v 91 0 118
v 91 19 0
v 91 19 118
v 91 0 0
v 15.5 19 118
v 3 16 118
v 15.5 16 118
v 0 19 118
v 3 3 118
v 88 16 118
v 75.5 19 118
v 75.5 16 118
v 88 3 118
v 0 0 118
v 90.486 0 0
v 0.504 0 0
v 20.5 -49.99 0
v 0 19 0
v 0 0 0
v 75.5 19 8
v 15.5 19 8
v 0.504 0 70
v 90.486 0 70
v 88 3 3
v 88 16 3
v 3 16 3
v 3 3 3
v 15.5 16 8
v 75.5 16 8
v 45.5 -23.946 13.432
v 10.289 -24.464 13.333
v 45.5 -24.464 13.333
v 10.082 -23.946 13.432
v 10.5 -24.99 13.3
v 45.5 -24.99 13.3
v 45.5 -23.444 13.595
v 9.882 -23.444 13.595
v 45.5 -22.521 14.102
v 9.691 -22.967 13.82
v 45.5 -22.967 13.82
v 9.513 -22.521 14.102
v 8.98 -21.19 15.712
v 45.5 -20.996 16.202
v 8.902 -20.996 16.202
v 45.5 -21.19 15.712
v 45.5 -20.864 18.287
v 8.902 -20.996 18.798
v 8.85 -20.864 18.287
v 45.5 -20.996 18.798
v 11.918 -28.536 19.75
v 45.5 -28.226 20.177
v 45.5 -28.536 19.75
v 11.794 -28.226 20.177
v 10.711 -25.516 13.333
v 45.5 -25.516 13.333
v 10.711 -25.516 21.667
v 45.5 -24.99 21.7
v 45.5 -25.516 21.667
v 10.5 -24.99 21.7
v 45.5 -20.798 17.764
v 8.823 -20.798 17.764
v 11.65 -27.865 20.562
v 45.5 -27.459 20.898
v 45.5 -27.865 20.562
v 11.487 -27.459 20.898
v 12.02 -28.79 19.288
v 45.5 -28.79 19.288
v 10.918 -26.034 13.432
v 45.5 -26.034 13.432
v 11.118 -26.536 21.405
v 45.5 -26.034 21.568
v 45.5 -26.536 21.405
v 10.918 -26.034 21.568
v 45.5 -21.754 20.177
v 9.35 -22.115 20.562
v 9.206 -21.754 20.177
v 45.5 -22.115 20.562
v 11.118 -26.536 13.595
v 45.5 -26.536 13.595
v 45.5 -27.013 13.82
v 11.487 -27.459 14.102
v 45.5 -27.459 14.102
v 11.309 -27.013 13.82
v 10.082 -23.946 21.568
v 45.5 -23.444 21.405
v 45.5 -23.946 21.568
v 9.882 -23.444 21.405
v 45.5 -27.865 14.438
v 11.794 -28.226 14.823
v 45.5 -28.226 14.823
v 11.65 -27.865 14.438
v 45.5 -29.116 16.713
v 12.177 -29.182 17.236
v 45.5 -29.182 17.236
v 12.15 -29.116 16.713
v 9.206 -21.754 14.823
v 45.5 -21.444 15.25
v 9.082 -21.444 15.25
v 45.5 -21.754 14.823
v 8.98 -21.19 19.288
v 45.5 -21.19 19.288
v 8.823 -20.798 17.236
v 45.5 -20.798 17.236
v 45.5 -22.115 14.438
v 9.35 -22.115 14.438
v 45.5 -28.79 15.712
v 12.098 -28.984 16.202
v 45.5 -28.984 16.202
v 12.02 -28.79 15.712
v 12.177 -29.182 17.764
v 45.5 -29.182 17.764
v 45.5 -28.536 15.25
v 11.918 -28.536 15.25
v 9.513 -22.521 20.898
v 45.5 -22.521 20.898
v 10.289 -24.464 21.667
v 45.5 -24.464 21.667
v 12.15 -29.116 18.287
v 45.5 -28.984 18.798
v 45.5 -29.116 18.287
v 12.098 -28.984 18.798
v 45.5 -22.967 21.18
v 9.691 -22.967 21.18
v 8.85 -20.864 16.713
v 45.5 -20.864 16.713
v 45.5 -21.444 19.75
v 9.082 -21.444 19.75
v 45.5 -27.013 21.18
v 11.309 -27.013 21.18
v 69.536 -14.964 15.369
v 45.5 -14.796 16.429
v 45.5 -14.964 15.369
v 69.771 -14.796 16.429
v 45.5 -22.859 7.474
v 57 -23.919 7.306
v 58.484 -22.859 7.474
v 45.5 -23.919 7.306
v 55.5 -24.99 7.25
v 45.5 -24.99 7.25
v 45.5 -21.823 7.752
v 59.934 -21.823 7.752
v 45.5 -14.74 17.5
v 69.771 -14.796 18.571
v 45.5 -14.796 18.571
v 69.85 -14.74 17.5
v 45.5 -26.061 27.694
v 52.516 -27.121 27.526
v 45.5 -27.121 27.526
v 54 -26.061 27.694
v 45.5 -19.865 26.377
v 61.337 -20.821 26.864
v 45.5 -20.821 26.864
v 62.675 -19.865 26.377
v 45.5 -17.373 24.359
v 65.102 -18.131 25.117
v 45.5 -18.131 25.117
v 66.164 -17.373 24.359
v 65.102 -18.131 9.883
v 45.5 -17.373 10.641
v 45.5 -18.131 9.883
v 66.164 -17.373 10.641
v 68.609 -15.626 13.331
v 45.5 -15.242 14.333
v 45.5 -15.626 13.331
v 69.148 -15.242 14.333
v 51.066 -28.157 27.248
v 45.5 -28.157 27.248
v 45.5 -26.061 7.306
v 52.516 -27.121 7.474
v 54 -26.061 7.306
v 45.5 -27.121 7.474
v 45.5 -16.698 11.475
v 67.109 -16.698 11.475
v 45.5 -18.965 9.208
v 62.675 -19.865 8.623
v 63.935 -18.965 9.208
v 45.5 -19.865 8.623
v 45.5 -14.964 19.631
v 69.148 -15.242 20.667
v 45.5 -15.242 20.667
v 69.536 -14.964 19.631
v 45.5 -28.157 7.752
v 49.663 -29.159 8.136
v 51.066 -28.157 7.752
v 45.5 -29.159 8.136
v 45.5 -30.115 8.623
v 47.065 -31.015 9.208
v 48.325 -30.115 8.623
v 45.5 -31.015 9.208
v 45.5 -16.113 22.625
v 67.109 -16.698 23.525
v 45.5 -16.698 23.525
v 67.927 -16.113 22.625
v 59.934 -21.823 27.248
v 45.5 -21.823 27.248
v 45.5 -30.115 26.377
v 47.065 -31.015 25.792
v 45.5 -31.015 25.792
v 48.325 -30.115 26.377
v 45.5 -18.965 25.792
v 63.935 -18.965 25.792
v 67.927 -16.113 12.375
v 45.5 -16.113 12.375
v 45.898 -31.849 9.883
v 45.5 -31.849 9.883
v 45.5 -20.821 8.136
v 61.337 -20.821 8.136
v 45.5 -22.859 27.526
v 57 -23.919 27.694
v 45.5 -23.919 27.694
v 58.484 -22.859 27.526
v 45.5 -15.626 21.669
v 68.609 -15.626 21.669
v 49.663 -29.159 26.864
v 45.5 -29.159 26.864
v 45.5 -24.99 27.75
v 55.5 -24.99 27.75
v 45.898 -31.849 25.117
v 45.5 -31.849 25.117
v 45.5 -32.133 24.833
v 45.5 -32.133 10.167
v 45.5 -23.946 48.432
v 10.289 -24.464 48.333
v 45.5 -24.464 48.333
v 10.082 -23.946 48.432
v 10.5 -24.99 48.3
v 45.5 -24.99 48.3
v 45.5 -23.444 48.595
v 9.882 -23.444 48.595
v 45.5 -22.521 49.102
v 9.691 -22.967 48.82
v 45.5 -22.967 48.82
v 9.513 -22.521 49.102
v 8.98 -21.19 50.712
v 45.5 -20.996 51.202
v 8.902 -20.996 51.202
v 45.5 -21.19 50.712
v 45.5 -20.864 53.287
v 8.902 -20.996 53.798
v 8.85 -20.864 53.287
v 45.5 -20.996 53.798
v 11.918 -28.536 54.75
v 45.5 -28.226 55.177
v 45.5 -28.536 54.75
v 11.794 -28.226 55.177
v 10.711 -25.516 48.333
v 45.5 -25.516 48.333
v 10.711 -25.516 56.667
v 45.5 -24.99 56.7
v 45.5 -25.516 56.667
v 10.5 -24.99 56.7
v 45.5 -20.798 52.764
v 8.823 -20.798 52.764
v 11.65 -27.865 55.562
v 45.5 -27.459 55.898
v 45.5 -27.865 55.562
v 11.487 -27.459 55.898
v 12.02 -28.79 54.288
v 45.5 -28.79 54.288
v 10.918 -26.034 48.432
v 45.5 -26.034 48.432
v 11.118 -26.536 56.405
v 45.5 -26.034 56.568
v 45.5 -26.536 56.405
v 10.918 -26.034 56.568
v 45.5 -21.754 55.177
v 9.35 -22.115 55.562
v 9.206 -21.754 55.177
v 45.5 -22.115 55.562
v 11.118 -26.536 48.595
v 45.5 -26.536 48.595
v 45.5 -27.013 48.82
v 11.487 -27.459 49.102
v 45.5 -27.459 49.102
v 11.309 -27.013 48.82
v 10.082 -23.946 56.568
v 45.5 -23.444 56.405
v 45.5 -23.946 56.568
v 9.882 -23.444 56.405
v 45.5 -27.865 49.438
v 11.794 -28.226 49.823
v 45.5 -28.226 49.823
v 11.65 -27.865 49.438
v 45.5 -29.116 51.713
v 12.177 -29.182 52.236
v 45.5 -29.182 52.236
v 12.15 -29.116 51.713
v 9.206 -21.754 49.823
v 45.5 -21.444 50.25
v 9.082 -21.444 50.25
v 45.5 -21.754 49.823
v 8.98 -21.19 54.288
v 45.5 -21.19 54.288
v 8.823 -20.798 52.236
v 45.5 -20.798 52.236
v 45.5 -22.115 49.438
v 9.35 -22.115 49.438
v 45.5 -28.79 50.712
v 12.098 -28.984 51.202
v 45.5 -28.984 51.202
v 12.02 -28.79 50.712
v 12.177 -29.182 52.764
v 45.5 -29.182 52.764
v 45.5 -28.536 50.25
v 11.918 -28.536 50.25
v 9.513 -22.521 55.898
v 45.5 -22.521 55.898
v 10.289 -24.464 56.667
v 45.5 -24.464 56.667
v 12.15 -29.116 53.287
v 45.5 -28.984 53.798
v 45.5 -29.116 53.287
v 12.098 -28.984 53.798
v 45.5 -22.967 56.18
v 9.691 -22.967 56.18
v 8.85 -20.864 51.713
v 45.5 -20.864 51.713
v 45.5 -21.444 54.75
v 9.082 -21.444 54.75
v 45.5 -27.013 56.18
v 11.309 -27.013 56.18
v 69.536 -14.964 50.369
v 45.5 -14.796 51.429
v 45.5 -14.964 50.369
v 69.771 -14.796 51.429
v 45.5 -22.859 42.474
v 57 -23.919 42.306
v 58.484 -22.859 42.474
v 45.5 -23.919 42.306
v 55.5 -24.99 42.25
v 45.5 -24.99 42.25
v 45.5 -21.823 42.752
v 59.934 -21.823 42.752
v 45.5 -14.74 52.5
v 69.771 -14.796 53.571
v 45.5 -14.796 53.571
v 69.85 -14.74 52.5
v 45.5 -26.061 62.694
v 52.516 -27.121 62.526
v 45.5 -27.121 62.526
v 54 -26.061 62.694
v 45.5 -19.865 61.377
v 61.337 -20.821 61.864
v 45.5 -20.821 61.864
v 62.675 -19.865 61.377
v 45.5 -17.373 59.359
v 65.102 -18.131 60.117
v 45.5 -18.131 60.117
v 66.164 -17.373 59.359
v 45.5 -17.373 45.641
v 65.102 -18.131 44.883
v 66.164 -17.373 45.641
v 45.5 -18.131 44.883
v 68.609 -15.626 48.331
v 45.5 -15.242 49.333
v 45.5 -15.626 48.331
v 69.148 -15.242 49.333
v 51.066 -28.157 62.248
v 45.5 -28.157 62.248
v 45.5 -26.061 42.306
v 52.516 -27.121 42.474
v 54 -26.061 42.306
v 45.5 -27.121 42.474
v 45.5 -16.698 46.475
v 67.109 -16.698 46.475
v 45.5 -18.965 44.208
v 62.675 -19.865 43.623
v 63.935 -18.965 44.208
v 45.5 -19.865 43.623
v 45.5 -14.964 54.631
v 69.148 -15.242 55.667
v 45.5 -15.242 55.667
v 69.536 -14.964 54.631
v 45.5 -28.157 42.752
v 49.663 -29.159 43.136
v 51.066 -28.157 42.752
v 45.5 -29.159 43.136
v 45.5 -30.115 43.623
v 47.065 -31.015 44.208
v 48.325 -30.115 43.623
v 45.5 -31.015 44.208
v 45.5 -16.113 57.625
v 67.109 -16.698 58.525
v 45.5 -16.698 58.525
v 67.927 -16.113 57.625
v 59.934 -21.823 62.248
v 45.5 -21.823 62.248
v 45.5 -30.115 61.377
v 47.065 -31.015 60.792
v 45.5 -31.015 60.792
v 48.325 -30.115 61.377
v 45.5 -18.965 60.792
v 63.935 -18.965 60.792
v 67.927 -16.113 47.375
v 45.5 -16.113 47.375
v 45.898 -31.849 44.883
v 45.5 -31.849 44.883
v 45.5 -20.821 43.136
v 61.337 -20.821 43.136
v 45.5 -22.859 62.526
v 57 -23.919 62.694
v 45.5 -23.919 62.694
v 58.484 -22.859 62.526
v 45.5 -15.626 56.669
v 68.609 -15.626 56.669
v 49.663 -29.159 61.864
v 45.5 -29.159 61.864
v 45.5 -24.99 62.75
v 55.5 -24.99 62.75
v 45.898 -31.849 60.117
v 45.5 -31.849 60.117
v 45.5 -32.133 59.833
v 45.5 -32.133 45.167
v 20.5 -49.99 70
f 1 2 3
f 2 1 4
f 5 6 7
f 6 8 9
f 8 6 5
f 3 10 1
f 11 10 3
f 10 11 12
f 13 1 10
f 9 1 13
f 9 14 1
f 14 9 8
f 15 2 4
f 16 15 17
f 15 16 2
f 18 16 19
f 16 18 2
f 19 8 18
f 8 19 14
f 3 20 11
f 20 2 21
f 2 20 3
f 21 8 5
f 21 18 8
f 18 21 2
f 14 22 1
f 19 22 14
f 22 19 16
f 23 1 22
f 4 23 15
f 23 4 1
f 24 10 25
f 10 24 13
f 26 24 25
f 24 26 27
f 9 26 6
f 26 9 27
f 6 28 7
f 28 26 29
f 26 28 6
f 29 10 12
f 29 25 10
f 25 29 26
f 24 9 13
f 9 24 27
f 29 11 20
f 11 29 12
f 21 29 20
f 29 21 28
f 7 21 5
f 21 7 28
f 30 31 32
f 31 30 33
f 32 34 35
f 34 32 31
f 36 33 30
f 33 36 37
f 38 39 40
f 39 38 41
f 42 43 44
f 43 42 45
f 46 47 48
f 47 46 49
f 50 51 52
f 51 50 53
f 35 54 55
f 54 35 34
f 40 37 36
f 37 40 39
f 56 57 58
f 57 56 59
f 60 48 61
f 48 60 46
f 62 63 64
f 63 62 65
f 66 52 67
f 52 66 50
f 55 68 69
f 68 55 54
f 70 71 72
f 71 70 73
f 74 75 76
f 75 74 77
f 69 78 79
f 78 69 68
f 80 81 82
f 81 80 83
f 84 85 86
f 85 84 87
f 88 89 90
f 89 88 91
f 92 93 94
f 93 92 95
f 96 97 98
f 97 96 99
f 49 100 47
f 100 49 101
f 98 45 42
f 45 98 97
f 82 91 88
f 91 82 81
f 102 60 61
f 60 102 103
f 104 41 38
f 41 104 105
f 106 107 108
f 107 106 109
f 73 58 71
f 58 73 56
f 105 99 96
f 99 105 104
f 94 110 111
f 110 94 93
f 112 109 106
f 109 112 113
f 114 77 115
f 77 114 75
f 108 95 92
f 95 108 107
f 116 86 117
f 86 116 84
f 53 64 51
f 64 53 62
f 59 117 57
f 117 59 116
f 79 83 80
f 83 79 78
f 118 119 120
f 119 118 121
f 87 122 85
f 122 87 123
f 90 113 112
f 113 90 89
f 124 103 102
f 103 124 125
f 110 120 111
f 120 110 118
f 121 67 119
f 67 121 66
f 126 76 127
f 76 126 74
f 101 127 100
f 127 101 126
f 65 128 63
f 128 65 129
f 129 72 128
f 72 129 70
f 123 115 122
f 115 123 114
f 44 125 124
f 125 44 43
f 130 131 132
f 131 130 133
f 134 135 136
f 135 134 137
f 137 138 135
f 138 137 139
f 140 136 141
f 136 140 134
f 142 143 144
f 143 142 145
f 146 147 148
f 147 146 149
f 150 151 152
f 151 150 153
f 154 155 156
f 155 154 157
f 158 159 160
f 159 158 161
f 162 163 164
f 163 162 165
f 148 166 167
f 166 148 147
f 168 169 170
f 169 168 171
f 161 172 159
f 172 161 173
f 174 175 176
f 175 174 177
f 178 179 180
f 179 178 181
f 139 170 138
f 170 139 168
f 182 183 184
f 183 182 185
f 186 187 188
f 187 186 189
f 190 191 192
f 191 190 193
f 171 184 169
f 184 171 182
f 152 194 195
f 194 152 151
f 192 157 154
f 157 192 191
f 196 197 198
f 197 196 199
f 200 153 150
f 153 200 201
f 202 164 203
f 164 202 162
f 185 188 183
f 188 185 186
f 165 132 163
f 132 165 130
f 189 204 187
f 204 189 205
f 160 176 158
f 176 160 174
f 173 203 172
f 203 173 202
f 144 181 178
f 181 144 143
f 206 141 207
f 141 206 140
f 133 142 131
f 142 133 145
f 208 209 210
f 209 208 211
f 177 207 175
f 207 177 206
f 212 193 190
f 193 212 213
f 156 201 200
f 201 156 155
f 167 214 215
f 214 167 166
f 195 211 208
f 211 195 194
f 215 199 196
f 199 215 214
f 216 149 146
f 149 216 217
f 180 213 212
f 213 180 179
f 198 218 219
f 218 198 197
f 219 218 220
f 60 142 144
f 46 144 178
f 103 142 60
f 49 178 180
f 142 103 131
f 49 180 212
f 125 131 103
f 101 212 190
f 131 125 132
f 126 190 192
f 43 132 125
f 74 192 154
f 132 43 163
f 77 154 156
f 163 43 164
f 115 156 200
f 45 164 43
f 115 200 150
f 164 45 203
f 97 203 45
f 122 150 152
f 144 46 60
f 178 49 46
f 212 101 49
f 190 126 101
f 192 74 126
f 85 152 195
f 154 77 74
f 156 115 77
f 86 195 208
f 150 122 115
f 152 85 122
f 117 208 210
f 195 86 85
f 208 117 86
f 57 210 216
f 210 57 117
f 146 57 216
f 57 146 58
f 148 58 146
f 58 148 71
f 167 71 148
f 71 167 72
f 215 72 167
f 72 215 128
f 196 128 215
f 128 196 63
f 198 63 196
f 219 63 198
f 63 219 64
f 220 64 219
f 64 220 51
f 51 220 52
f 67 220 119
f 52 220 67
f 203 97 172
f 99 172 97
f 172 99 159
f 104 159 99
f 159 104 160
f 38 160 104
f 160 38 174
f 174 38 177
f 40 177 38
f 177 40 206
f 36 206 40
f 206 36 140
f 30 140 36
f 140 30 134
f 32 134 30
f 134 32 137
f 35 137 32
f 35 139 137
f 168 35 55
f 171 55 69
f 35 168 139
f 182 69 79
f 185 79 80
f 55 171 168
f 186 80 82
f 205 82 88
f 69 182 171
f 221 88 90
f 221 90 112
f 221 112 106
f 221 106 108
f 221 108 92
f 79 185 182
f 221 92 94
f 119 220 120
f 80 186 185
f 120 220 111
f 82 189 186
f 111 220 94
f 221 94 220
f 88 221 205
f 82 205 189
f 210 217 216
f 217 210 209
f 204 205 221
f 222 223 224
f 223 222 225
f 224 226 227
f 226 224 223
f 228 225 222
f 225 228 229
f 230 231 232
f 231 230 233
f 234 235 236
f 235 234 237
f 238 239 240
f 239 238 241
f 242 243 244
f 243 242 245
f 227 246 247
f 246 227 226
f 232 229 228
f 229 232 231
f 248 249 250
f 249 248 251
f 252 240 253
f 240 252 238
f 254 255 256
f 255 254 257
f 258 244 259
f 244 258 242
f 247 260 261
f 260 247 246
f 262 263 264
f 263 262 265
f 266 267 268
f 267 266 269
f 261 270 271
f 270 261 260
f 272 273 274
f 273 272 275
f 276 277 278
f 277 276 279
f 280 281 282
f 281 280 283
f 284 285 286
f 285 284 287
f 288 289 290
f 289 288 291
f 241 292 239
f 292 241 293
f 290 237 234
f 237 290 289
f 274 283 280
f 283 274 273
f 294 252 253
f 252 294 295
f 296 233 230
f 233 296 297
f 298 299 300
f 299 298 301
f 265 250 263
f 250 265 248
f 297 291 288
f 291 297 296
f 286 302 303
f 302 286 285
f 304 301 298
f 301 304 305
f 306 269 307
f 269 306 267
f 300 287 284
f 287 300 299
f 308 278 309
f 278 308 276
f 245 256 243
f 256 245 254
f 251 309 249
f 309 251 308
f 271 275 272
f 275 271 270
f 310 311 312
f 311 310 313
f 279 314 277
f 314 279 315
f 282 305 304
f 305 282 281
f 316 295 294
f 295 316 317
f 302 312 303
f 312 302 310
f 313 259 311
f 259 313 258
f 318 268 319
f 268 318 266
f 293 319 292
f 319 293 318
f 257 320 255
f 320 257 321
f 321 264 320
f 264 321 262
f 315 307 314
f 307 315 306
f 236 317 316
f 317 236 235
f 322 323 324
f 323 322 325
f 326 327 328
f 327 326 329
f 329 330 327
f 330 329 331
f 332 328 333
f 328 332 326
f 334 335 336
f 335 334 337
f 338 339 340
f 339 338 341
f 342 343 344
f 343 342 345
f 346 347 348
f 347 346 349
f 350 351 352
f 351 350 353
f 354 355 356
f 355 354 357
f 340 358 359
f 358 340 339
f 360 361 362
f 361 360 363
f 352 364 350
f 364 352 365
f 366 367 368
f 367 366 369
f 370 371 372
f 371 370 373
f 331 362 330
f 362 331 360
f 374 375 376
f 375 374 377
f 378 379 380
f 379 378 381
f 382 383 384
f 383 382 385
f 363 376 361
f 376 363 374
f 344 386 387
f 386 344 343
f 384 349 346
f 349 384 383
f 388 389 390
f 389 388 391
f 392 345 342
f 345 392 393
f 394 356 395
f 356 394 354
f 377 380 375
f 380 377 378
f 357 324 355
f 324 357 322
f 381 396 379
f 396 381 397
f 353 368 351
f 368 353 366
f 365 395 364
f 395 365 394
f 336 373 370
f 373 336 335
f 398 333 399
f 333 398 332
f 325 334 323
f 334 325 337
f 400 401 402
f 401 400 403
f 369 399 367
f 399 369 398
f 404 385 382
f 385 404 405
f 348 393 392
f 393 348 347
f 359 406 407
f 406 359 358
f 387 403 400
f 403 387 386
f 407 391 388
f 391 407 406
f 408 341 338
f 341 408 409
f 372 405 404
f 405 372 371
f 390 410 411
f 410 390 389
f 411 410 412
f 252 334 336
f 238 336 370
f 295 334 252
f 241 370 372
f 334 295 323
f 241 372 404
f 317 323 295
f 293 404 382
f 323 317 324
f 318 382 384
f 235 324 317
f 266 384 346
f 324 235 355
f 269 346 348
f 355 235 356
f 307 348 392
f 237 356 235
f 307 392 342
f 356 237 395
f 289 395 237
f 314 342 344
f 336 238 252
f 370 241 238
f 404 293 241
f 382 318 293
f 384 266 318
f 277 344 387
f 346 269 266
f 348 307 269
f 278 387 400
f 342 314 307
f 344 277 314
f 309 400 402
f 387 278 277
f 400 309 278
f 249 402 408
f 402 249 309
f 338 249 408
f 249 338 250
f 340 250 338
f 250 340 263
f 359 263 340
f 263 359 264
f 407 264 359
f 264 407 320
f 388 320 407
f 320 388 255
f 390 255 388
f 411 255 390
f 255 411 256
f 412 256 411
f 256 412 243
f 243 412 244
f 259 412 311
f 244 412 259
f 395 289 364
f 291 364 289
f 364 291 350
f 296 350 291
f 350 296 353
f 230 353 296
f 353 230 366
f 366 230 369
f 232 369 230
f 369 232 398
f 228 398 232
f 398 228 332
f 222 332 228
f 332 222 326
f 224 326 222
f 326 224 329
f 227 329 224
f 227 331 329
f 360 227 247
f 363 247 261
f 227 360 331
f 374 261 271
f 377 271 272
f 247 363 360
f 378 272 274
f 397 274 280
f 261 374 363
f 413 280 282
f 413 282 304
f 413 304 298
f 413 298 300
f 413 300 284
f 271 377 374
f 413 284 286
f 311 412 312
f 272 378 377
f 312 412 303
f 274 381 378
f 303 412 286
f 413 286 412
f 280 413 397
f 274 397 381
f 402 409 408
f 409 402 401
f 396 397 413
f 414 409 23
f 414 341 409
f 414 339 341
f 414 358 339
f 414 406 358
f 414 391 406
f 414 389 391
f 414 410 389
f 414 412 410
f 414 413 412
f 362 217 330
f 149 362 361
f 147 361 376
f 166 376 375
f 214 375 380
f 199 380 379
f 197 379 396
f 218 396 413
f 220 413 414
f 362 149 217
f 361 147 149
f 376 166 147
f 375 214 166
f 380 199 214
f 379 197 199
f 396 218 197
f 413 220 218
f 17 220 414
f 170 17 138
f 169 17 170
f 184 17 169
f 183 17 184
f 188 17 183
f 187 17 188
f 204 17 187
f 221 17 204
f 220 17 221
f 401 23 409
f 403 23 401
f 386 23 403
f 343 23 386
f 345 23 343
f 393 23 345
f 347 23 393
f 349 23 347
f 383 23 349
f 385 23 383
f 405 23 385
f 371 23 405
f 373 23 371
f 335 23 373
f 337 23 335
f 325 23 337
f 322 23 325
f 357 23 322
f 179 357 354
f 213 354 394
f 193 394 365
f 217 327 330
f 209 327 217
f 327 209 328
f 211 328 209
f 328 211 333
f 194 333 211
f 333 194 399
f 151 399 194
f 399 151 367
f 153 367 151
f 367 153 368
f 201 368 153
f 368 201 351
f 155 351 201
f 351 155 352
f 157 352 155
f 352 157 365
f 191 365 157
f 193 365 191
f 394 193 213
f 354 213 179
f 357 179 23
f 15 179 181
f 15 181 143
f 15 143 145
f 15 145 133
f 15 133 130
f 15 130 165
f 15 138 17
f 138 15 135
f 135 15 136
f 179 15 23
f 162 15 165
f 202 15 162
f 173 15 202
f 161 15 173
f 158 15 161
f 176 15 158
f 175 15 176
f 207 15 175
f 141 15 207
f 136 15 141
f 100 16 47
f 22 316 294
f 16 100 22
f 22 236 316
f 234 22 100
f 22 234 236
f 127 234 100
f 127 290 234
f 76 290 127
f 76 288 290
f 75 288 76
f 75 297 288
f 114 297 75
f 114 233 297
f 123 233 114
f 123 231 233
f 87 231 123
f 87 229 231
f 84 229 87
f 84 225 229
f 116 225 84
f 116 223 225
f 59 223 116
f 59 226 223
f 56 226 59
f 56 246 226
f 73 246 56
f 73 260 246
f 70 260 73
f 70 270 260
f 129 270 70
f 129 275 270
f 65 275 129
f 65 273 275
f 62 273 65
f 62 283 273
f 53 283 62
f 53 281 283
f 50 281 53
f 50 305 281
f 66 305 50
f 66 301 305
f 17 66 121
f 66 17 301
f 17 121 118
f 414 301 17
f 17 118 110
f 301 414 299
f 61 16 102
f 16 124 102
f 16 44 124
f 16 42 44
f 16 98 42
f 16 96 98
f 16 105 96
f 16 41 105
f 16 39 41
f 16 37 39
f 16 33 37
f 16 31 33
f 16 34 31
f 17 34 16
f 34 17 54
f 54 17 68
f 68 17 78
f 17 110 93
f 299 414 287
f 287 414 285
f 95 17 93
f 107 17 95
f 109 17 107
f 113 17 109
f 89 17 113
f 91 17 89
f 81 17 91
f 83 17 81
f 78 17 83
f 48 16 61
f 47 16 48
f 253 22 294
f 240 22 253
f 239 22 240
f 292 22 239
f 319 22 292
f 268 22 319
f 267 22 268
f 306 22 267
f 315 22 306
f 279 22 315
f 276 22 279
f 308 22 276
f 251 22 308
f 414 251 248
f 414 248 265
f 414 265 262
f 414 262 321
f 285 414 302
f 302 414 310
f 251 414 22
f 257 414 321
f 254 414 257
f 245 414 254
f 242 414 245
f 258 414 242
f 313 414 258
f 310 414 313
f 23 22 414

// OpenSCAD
show_phone_holder = true; // Toggle the phone holder bracket visibility
show_wedge        = true; // Toggle the angled mounting wedge visibility
show_bolt_holes   = true; // Toggle the bolt holes and counterbores

// --- PHONE PARAMETERS ---
p_width      = 85;   // Internal width for the phone
p_height     = 115;  // Internal height for the phone
p_depth      = 13;   // Internal thickness/depth for the phone
p_wall       = 3;    // Thickness of the holder walls
p_lip_side   = 12.5; // Width of the retaining lips on the left and right
p_lip_bottom = 5;    // Height of the retaining lip at the bottom
p_tolerance  = 0.0;  // Extra spacing for fitment clearance

// --- WEDGE PARAMETERS ---
wedge_thick    = 50; // Thickness of the wedge at its thickest point
wedge_thin     = 0;  // Thickness of the wedge at its thinnest point
wedge_h        = 70; // Total height of the mounting wedge
wedge_z_offset = 0;  // Vertical offset for the wedge position 
wedge_skew_x   = 20; 
wedge_custom_width = 70; 
wedge_pos_offset_x = -10;

// --- BOLT HOLE PARAMETERS ---
bolt_diameter  = 8.4;  // Diameter of the main bolt shaft
counterbore_d  = 20.5; // Diameter of the counterbore (bolt head hole)
counterbore_h  = 45;   // Depth of the counterbore
bolt_spread    = 0.5;  // Vertical spacing ratio between the two bolts

// Render

holder_outer_width = p_width + (2 * p_wall) + p_tolerance;

if (show_phone_holder) {
    phone_holder(p_width, p_height, p_depth, p_wall, p_lip_side, p_lip_bottom, p_tolerance);
}

if (show_wedge) {
    real_wedge_w = (wedge_custom_width > 0) ? wedge_custom_width : holder_outer_width;
    

    center_offset_x = (holder_outer_width - real_wedge_w) / 2;


    translate([center_offset_x + wedge_pos_offset_x, 0.01, wedge_z_offset]) {
        if (show_bolt_holes) {
            difference() {
                wedge_back(real_wedge_w, wedge_h, wedge_thick, wedge_thin, wedge_skew_x);
                
                translate([wedge_skew_x / 2, 0, 0]) 
                    bolt_holes_sideways(real_wedge_w, wedge_h, wedge_thick, bolt_spread);
            }
        } else {
            wedge_back(real_wedge_w, wedge_h, wedge_thick, wedge_thin, wedge_skew_x);
        }
    }
}

// --- MODULES ---

module phone_holder(inner_width, inner_height, inner_depth, wall, lip_s, lip_b, tolerance) {
    total_width  = inner_width + (2 * wall) + tolerance;
    total_depth  = wall + (inner_depth + tolerance) + wall;
    total_height = inner_height + wall;

    difference() {
        cube([total_width, total_depth, total_height]);
        
        translate([wall, wall, wall]) {
            cube([inner_width + tolerance, inner_depth + tolerance, inner_height + 1]);
        }
        
        translate([wall + lip_s, wall + inner_depth + tolerance - 0.05, wall + lip_b]) {
            cube([(inner_width + tolerance) - (2 * lip_s), wall + 1, inner_height + 1]);
        }
    }
}

module wedge_back(w_width, w_height, t_thick, t_thin, skew) {
    points = [
        [0, 0, 0], 
        [w_width, 0, 0], 
        [w_width + skew, -t_thin, 0], 
        [0 + skew, -t_thick, 0],
        
        [0, 0, w_height], 
        [w_width, 0, w_height], 
        [w_width + skew, -t_thin, w_height], 
        [0 + skew, -t_thick, w_height]
    ];
    faces = [
        [0, 3, 2, 1], [0, 1, 5, 4], [4, 5, 6, 7], 
        [1, 2, 6, 5], [0, 4, 7, 3], [3, 7, 6, 2]
    ];
    polyhedron(points = points, faces = faces);
}

module bolt_holes_sideways(w_width, w_height, t_thick, spread) {
    y_pos  = -t_thick / 2; 
    z_low  = w_height * (0.5 - spread/2);
    z_high = w_height * (0.5 + spread/2);

    for(z_pos = [z_low, z_high]) {
        translate([-50, y_pos , z_pos]) {
            rotate([0, 90, 0]) {
                cylinder(d = bolt_diameter, h = w_width + 100, $fn = 50);
                
                translate([0, 0, w_width + 50 + 10 - counterbore_h]) {
                    cylinder(d = counterbore_d, h = counterbore_h + 1, $fn = 60);
                }
            }
        }
    }
}
